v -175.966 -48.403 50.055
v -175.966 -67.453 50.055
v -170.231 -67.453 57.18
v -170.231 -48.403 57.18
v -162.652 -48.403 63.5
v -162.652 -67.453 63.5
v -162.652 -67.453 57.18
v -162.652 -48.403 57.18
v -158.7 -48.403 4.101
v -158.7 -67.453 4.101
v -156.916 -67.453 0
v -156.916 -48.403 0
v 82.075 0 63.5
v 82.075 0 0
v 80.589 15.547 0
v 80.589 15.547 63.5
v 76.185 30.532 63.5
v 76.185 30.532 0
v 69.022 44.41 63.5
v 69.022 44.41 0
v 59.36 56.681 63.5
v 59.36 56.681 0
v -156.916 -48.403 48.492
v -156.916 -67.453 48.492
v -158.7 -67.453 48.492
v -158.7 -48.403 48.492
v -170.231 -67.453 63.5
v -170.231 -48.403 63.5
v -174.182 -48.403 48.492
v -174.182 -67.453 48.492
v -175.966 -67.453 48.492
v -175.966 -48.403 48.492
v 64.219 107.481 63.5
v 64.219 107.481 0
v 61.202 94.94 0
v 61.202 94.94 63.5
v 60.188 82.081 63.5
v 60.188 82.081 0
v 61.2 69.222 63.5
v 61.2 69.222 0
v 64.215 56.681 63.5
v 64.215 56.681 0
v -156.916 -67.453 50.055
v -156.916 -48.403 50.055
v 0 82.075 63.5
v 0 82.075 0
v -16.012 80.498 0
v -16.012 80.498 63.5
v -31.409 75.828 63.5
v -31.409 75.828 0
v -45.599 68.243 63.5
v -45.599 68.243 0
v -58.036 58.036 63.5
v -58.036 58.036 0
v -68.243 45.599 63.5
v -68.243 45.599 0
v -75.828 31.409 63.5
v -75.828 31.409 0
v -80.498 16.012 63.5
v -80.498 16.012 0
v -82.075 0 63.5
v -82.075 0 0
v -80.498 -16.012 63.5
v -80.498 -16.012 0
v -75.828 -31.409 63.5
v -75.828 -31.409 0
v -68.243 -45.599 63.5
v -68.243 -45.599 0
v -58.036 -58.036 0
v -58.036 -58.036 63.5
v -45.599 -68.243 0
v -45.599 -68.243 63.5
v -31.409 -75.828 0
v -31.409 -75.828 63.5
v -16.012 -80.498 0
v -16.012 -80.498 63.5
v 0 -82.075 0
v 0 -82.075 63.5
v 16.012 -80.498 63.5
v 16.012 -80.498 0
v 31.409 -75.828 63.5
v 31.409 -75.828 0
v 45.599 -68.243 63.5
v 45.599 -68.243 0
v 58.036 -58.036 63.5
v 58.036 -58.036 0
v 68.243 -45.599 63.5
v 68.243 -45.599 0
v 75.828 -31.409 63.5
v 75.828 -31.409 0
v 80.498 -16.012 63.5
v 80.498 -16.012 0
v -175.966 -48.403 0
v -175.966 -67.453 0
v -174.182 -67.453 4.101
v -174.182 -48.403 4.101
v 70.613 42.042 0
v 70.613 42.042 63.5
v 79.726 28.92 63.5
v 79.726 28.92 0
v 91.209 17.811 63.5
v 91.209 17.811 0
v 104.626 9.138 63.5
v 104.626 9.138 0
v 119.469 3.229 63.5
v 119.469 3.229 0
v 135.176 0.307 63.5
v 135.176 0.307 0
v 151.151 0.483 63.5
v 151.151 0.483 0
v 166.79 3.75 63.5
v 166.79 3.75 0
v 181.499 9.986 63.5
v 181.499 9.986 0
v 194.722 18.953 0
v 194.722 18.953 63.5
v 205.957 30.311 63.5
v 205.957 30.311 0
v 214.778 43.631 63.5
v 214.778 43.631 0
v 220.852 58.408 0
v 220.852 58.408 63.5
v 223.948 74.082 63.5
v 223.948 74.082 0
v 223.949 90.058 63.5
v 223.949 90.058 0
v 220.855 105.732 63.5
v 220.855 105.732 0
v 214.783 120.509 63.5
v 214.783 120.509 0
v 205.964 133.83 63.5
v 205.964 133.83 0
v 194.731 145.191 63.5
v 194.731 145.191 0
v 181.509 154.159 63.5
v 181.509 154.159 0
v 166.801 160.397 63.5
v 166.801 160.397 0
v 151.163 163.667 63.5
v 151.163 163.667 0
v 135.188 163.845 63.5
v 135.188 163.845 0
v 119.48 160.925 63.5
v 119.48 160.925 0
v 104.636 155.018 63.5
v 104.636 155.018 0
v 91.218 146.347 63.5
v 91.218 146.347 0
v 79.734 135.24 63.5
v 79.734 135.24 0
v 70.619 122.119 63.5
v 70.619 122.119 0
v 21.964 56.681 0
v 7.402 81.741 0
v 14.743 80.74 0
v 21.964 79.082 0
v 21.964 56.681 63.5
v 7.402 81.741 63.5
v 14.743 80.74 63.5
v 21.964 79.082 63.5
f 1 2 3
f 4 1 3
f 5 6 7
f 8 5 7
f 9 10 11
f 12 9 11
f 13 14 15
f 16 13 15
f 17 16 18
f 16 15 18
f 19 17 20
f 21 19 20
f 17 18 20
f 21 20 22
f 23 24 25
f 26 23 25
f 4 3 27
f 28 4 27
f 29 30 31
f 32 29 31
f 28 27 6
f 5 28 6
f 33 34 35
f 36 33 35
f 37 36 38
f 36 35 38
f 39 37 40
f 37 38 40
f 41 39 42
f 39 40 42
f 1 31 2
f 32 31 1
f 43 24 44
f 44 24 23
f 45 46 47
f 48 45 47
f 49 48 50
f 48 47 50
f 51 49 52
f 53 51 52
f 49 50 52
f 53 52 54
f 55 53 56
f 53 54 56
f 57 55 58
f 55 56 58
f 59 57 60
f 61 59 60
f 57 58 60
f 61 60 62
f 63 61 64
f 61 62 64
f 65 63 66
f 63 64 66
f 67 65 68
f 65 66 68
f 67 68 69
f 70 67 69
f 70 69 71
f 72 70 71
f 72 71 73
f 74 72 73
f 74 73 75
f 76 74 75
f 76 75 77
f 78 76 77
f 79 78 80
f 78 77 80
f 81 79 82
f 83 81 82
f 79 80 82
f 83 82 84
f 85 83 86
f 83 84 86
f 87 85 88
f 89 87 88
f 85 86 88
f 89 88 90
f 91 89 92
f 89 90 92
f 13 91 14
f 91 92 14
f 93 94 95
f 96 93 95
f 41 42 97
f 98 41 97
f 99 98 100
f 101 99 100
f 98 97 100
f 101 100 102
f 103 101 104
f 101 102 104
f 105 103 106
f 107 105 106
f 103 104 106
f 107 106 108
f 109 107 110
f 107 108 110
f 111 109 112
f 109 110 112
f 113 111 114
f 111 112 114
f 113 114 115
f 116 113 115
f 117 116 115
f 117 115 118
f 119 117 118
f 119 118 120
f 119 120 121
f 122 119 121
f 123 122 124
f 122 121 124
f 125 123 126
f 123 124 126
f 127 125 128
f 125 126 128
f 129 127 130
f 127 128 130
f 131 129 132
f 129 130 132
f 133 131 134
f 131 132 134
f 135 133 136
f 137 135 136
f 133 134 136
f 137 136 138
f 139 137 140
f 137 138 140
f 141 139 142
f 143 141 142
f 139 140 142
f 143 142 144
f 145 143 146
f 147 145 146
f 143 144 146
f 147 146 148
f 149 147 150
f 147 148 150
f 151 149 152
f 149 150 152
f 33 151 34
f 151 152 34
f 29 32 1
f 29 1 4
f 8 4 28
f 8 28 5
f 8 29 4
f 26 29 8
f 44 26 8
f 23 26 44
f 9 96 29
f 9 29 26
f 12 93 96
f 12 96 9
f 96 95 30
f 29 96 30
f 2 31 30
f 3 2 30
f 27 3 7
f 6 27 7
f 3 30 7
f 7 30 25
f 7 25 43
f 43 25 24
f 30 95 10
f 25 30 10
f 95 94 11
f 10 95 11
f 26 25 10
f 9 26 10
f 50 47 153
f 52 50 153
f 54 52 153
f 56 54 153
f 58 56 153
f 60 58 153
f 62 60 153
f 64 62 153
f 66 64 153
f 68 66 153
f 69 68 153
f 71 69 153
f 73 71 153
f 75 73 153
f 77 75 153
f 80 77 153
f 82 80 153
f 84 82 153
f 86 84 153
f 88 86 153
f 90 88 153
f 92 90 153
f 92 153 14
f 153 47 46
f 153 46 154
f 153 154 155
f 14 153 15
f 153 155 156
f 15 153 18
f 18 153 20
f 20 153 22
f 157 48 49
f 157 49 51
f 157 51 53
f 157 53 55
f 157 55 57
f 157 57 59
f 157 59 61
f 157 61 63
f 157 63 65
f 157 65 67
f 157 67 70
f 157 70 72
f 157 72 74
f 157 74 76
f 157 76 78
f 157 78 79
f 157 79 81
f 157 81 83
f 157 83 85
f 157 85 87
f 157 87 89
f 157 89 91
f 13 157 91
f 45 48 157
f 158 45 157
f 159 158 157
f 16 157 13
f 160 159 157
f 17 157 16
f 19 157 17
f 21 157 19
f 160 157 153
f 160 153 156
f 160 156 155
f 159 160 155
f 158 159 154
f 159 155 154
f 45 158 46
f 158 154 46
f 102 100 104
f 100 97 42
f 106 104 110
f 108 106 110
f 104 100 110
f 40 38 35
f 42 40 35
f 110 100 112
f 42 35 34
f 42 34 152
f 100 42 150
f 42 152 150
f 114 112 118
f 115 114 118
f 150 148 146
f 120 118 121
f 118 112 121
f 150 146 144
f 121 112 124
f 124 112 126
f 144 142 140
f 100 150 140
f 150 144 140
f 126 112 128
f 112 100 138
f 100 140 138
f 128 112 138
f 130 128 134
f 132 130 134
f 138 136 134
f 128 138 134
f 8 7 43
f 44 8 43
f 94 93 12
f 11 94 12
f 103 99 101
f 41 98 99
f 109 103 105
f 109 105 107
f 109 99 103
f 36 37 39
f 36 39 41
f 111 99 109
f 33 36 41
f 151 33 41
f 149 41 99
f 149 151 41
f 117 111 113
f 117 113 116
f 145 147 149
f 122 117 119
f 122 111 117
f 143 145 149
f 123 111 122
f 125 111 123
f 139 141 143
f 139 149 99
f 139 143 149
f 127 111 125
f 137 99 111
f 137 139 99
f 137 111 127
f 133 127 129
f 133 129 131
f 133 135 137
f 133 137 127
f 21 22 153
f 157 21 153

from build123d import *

# Parameters (mm, degrees)
F1_DEPTH = 63.5
F2_W     = 19.05
F2_H     = 19.05
F3_DEPTH = 63.5
F5_DEPTH = 25.4
F6_DEPTH = 25.4


with BuildPart() as f1:
    # F0 (on Top) → F1 (new body)
    with BuildSketch(Plane.XY):
        with BuildLine():
            ThreePointArc((3.706e-07, 82.0754298145), (-58.0360931216, -58.0360928596), (82.0754298145, 0))
            ThreePointArc((82.0754298145, 0), (76.1852973221, 30.5315681088), (59.3603090217, 56.6809482285))
            Line((59.3603090217, 56.6809482285), (21.9643415828, 56.6809482285))
            Line((21.9643415828, 56.6809482285), (21.9643415828, 79.0818808455))
            ThreePointArc((21.9643415828, 79.0818808455), (11.0837003396, 81.3235990719), (3.706e-07, 82.0754298145))
        make_face()
    extrude(amount=F1_DEPTH)


with BuildPart() as f1b:
    # F0 (on Top) → F1, piece 2 (new body)
    with BuildSketch(Plane.XY):
        with BuildLine():
            Line((72.7643415828, 56.6809482285), (64.2149444137, 56.6809482285))
            ThreePointArc((64.2149444137, 56.6809482285), (155.1189122788, 1.0131001695), (224.3384138205, 82.0754298145))
            ThreePointArc((224.3384138205, 82.0754298145), (155.124643919, 163.136850253), (64.2185363282, 107.4809482285))
            Line((64.2185363282, 107.4809482285), (72.7643415828, 107.4809482285))
            Line((72.7643415828, 107.4809482285), (72.7643415828, 56.6809482285))
        make_face()
        with BuildLine():
            ThreePointArc((64.2185363282, 107.4809482285), (60.1875543967, 82.0812331201), (64.2149444137, 56.6809482285))
            Line((64.2149444137, 56.6809482285), (72.7643415828, 56.6809482285))
            Line((72.7643415828, 56.6809482285), (72.7643415828, 107.4809482285))
            Line((72.7643415828, 107.4809482285), (64.2185363282, 107.4809482285))
        make_face()
    extrude(amount=F1_DEPTH)


with BuildPart() as f3:
    # F2 (on Top) → F3 (new body)
    with BuildSketch(Plane.XY):
        with Locations((-166.4411127567, -57.9276421648)):
            Rectangle(F2_W, F2_H)
    extrude(amount=F3_DEPTH)

    # F4 (on face) → F5 (cut)
    with BuildSketch(Plane.XZ.offset(67.4526421648)):
        Polygon((-162.651643157, 57.180352509), (-156.9161127567, 50.0548891723), (-156.9161127567, 63.5), (-162.651643157, 63.5), align=None)
        Polygon((-158.6997658014, 4.1012191214), (-156.9161127567, 0), (-156.9161127567, 48.4922751784), (-158.6997658014, 48.4922751784), align=None)
    extrude(amount=-F5_DEPTH, mode=Mode.SUBTRACT)

    # F4 (on face) → F6 (cut)
    with BuildSketch(Plane.XZ.offset(67.4526421648)):
        Polygon((-170.2305823565, 57.180352509), (-170.2305823565, 63.5), (-175.9661127567, 63.5), (-175.9661127567, 50.0548891723), align=None)
        Polygon((-175.9661127567, 48.4922751784), (-175.9661127567, 0), (-174.182459712, 4.1012191214), (-174.182459712, 48.4922751784), align=None)
    extrude(amount=-F6_DEPTH, mode=Mode.SUBTRACT)


solid = Compound([f1.part, f1b.part, f3.part])
